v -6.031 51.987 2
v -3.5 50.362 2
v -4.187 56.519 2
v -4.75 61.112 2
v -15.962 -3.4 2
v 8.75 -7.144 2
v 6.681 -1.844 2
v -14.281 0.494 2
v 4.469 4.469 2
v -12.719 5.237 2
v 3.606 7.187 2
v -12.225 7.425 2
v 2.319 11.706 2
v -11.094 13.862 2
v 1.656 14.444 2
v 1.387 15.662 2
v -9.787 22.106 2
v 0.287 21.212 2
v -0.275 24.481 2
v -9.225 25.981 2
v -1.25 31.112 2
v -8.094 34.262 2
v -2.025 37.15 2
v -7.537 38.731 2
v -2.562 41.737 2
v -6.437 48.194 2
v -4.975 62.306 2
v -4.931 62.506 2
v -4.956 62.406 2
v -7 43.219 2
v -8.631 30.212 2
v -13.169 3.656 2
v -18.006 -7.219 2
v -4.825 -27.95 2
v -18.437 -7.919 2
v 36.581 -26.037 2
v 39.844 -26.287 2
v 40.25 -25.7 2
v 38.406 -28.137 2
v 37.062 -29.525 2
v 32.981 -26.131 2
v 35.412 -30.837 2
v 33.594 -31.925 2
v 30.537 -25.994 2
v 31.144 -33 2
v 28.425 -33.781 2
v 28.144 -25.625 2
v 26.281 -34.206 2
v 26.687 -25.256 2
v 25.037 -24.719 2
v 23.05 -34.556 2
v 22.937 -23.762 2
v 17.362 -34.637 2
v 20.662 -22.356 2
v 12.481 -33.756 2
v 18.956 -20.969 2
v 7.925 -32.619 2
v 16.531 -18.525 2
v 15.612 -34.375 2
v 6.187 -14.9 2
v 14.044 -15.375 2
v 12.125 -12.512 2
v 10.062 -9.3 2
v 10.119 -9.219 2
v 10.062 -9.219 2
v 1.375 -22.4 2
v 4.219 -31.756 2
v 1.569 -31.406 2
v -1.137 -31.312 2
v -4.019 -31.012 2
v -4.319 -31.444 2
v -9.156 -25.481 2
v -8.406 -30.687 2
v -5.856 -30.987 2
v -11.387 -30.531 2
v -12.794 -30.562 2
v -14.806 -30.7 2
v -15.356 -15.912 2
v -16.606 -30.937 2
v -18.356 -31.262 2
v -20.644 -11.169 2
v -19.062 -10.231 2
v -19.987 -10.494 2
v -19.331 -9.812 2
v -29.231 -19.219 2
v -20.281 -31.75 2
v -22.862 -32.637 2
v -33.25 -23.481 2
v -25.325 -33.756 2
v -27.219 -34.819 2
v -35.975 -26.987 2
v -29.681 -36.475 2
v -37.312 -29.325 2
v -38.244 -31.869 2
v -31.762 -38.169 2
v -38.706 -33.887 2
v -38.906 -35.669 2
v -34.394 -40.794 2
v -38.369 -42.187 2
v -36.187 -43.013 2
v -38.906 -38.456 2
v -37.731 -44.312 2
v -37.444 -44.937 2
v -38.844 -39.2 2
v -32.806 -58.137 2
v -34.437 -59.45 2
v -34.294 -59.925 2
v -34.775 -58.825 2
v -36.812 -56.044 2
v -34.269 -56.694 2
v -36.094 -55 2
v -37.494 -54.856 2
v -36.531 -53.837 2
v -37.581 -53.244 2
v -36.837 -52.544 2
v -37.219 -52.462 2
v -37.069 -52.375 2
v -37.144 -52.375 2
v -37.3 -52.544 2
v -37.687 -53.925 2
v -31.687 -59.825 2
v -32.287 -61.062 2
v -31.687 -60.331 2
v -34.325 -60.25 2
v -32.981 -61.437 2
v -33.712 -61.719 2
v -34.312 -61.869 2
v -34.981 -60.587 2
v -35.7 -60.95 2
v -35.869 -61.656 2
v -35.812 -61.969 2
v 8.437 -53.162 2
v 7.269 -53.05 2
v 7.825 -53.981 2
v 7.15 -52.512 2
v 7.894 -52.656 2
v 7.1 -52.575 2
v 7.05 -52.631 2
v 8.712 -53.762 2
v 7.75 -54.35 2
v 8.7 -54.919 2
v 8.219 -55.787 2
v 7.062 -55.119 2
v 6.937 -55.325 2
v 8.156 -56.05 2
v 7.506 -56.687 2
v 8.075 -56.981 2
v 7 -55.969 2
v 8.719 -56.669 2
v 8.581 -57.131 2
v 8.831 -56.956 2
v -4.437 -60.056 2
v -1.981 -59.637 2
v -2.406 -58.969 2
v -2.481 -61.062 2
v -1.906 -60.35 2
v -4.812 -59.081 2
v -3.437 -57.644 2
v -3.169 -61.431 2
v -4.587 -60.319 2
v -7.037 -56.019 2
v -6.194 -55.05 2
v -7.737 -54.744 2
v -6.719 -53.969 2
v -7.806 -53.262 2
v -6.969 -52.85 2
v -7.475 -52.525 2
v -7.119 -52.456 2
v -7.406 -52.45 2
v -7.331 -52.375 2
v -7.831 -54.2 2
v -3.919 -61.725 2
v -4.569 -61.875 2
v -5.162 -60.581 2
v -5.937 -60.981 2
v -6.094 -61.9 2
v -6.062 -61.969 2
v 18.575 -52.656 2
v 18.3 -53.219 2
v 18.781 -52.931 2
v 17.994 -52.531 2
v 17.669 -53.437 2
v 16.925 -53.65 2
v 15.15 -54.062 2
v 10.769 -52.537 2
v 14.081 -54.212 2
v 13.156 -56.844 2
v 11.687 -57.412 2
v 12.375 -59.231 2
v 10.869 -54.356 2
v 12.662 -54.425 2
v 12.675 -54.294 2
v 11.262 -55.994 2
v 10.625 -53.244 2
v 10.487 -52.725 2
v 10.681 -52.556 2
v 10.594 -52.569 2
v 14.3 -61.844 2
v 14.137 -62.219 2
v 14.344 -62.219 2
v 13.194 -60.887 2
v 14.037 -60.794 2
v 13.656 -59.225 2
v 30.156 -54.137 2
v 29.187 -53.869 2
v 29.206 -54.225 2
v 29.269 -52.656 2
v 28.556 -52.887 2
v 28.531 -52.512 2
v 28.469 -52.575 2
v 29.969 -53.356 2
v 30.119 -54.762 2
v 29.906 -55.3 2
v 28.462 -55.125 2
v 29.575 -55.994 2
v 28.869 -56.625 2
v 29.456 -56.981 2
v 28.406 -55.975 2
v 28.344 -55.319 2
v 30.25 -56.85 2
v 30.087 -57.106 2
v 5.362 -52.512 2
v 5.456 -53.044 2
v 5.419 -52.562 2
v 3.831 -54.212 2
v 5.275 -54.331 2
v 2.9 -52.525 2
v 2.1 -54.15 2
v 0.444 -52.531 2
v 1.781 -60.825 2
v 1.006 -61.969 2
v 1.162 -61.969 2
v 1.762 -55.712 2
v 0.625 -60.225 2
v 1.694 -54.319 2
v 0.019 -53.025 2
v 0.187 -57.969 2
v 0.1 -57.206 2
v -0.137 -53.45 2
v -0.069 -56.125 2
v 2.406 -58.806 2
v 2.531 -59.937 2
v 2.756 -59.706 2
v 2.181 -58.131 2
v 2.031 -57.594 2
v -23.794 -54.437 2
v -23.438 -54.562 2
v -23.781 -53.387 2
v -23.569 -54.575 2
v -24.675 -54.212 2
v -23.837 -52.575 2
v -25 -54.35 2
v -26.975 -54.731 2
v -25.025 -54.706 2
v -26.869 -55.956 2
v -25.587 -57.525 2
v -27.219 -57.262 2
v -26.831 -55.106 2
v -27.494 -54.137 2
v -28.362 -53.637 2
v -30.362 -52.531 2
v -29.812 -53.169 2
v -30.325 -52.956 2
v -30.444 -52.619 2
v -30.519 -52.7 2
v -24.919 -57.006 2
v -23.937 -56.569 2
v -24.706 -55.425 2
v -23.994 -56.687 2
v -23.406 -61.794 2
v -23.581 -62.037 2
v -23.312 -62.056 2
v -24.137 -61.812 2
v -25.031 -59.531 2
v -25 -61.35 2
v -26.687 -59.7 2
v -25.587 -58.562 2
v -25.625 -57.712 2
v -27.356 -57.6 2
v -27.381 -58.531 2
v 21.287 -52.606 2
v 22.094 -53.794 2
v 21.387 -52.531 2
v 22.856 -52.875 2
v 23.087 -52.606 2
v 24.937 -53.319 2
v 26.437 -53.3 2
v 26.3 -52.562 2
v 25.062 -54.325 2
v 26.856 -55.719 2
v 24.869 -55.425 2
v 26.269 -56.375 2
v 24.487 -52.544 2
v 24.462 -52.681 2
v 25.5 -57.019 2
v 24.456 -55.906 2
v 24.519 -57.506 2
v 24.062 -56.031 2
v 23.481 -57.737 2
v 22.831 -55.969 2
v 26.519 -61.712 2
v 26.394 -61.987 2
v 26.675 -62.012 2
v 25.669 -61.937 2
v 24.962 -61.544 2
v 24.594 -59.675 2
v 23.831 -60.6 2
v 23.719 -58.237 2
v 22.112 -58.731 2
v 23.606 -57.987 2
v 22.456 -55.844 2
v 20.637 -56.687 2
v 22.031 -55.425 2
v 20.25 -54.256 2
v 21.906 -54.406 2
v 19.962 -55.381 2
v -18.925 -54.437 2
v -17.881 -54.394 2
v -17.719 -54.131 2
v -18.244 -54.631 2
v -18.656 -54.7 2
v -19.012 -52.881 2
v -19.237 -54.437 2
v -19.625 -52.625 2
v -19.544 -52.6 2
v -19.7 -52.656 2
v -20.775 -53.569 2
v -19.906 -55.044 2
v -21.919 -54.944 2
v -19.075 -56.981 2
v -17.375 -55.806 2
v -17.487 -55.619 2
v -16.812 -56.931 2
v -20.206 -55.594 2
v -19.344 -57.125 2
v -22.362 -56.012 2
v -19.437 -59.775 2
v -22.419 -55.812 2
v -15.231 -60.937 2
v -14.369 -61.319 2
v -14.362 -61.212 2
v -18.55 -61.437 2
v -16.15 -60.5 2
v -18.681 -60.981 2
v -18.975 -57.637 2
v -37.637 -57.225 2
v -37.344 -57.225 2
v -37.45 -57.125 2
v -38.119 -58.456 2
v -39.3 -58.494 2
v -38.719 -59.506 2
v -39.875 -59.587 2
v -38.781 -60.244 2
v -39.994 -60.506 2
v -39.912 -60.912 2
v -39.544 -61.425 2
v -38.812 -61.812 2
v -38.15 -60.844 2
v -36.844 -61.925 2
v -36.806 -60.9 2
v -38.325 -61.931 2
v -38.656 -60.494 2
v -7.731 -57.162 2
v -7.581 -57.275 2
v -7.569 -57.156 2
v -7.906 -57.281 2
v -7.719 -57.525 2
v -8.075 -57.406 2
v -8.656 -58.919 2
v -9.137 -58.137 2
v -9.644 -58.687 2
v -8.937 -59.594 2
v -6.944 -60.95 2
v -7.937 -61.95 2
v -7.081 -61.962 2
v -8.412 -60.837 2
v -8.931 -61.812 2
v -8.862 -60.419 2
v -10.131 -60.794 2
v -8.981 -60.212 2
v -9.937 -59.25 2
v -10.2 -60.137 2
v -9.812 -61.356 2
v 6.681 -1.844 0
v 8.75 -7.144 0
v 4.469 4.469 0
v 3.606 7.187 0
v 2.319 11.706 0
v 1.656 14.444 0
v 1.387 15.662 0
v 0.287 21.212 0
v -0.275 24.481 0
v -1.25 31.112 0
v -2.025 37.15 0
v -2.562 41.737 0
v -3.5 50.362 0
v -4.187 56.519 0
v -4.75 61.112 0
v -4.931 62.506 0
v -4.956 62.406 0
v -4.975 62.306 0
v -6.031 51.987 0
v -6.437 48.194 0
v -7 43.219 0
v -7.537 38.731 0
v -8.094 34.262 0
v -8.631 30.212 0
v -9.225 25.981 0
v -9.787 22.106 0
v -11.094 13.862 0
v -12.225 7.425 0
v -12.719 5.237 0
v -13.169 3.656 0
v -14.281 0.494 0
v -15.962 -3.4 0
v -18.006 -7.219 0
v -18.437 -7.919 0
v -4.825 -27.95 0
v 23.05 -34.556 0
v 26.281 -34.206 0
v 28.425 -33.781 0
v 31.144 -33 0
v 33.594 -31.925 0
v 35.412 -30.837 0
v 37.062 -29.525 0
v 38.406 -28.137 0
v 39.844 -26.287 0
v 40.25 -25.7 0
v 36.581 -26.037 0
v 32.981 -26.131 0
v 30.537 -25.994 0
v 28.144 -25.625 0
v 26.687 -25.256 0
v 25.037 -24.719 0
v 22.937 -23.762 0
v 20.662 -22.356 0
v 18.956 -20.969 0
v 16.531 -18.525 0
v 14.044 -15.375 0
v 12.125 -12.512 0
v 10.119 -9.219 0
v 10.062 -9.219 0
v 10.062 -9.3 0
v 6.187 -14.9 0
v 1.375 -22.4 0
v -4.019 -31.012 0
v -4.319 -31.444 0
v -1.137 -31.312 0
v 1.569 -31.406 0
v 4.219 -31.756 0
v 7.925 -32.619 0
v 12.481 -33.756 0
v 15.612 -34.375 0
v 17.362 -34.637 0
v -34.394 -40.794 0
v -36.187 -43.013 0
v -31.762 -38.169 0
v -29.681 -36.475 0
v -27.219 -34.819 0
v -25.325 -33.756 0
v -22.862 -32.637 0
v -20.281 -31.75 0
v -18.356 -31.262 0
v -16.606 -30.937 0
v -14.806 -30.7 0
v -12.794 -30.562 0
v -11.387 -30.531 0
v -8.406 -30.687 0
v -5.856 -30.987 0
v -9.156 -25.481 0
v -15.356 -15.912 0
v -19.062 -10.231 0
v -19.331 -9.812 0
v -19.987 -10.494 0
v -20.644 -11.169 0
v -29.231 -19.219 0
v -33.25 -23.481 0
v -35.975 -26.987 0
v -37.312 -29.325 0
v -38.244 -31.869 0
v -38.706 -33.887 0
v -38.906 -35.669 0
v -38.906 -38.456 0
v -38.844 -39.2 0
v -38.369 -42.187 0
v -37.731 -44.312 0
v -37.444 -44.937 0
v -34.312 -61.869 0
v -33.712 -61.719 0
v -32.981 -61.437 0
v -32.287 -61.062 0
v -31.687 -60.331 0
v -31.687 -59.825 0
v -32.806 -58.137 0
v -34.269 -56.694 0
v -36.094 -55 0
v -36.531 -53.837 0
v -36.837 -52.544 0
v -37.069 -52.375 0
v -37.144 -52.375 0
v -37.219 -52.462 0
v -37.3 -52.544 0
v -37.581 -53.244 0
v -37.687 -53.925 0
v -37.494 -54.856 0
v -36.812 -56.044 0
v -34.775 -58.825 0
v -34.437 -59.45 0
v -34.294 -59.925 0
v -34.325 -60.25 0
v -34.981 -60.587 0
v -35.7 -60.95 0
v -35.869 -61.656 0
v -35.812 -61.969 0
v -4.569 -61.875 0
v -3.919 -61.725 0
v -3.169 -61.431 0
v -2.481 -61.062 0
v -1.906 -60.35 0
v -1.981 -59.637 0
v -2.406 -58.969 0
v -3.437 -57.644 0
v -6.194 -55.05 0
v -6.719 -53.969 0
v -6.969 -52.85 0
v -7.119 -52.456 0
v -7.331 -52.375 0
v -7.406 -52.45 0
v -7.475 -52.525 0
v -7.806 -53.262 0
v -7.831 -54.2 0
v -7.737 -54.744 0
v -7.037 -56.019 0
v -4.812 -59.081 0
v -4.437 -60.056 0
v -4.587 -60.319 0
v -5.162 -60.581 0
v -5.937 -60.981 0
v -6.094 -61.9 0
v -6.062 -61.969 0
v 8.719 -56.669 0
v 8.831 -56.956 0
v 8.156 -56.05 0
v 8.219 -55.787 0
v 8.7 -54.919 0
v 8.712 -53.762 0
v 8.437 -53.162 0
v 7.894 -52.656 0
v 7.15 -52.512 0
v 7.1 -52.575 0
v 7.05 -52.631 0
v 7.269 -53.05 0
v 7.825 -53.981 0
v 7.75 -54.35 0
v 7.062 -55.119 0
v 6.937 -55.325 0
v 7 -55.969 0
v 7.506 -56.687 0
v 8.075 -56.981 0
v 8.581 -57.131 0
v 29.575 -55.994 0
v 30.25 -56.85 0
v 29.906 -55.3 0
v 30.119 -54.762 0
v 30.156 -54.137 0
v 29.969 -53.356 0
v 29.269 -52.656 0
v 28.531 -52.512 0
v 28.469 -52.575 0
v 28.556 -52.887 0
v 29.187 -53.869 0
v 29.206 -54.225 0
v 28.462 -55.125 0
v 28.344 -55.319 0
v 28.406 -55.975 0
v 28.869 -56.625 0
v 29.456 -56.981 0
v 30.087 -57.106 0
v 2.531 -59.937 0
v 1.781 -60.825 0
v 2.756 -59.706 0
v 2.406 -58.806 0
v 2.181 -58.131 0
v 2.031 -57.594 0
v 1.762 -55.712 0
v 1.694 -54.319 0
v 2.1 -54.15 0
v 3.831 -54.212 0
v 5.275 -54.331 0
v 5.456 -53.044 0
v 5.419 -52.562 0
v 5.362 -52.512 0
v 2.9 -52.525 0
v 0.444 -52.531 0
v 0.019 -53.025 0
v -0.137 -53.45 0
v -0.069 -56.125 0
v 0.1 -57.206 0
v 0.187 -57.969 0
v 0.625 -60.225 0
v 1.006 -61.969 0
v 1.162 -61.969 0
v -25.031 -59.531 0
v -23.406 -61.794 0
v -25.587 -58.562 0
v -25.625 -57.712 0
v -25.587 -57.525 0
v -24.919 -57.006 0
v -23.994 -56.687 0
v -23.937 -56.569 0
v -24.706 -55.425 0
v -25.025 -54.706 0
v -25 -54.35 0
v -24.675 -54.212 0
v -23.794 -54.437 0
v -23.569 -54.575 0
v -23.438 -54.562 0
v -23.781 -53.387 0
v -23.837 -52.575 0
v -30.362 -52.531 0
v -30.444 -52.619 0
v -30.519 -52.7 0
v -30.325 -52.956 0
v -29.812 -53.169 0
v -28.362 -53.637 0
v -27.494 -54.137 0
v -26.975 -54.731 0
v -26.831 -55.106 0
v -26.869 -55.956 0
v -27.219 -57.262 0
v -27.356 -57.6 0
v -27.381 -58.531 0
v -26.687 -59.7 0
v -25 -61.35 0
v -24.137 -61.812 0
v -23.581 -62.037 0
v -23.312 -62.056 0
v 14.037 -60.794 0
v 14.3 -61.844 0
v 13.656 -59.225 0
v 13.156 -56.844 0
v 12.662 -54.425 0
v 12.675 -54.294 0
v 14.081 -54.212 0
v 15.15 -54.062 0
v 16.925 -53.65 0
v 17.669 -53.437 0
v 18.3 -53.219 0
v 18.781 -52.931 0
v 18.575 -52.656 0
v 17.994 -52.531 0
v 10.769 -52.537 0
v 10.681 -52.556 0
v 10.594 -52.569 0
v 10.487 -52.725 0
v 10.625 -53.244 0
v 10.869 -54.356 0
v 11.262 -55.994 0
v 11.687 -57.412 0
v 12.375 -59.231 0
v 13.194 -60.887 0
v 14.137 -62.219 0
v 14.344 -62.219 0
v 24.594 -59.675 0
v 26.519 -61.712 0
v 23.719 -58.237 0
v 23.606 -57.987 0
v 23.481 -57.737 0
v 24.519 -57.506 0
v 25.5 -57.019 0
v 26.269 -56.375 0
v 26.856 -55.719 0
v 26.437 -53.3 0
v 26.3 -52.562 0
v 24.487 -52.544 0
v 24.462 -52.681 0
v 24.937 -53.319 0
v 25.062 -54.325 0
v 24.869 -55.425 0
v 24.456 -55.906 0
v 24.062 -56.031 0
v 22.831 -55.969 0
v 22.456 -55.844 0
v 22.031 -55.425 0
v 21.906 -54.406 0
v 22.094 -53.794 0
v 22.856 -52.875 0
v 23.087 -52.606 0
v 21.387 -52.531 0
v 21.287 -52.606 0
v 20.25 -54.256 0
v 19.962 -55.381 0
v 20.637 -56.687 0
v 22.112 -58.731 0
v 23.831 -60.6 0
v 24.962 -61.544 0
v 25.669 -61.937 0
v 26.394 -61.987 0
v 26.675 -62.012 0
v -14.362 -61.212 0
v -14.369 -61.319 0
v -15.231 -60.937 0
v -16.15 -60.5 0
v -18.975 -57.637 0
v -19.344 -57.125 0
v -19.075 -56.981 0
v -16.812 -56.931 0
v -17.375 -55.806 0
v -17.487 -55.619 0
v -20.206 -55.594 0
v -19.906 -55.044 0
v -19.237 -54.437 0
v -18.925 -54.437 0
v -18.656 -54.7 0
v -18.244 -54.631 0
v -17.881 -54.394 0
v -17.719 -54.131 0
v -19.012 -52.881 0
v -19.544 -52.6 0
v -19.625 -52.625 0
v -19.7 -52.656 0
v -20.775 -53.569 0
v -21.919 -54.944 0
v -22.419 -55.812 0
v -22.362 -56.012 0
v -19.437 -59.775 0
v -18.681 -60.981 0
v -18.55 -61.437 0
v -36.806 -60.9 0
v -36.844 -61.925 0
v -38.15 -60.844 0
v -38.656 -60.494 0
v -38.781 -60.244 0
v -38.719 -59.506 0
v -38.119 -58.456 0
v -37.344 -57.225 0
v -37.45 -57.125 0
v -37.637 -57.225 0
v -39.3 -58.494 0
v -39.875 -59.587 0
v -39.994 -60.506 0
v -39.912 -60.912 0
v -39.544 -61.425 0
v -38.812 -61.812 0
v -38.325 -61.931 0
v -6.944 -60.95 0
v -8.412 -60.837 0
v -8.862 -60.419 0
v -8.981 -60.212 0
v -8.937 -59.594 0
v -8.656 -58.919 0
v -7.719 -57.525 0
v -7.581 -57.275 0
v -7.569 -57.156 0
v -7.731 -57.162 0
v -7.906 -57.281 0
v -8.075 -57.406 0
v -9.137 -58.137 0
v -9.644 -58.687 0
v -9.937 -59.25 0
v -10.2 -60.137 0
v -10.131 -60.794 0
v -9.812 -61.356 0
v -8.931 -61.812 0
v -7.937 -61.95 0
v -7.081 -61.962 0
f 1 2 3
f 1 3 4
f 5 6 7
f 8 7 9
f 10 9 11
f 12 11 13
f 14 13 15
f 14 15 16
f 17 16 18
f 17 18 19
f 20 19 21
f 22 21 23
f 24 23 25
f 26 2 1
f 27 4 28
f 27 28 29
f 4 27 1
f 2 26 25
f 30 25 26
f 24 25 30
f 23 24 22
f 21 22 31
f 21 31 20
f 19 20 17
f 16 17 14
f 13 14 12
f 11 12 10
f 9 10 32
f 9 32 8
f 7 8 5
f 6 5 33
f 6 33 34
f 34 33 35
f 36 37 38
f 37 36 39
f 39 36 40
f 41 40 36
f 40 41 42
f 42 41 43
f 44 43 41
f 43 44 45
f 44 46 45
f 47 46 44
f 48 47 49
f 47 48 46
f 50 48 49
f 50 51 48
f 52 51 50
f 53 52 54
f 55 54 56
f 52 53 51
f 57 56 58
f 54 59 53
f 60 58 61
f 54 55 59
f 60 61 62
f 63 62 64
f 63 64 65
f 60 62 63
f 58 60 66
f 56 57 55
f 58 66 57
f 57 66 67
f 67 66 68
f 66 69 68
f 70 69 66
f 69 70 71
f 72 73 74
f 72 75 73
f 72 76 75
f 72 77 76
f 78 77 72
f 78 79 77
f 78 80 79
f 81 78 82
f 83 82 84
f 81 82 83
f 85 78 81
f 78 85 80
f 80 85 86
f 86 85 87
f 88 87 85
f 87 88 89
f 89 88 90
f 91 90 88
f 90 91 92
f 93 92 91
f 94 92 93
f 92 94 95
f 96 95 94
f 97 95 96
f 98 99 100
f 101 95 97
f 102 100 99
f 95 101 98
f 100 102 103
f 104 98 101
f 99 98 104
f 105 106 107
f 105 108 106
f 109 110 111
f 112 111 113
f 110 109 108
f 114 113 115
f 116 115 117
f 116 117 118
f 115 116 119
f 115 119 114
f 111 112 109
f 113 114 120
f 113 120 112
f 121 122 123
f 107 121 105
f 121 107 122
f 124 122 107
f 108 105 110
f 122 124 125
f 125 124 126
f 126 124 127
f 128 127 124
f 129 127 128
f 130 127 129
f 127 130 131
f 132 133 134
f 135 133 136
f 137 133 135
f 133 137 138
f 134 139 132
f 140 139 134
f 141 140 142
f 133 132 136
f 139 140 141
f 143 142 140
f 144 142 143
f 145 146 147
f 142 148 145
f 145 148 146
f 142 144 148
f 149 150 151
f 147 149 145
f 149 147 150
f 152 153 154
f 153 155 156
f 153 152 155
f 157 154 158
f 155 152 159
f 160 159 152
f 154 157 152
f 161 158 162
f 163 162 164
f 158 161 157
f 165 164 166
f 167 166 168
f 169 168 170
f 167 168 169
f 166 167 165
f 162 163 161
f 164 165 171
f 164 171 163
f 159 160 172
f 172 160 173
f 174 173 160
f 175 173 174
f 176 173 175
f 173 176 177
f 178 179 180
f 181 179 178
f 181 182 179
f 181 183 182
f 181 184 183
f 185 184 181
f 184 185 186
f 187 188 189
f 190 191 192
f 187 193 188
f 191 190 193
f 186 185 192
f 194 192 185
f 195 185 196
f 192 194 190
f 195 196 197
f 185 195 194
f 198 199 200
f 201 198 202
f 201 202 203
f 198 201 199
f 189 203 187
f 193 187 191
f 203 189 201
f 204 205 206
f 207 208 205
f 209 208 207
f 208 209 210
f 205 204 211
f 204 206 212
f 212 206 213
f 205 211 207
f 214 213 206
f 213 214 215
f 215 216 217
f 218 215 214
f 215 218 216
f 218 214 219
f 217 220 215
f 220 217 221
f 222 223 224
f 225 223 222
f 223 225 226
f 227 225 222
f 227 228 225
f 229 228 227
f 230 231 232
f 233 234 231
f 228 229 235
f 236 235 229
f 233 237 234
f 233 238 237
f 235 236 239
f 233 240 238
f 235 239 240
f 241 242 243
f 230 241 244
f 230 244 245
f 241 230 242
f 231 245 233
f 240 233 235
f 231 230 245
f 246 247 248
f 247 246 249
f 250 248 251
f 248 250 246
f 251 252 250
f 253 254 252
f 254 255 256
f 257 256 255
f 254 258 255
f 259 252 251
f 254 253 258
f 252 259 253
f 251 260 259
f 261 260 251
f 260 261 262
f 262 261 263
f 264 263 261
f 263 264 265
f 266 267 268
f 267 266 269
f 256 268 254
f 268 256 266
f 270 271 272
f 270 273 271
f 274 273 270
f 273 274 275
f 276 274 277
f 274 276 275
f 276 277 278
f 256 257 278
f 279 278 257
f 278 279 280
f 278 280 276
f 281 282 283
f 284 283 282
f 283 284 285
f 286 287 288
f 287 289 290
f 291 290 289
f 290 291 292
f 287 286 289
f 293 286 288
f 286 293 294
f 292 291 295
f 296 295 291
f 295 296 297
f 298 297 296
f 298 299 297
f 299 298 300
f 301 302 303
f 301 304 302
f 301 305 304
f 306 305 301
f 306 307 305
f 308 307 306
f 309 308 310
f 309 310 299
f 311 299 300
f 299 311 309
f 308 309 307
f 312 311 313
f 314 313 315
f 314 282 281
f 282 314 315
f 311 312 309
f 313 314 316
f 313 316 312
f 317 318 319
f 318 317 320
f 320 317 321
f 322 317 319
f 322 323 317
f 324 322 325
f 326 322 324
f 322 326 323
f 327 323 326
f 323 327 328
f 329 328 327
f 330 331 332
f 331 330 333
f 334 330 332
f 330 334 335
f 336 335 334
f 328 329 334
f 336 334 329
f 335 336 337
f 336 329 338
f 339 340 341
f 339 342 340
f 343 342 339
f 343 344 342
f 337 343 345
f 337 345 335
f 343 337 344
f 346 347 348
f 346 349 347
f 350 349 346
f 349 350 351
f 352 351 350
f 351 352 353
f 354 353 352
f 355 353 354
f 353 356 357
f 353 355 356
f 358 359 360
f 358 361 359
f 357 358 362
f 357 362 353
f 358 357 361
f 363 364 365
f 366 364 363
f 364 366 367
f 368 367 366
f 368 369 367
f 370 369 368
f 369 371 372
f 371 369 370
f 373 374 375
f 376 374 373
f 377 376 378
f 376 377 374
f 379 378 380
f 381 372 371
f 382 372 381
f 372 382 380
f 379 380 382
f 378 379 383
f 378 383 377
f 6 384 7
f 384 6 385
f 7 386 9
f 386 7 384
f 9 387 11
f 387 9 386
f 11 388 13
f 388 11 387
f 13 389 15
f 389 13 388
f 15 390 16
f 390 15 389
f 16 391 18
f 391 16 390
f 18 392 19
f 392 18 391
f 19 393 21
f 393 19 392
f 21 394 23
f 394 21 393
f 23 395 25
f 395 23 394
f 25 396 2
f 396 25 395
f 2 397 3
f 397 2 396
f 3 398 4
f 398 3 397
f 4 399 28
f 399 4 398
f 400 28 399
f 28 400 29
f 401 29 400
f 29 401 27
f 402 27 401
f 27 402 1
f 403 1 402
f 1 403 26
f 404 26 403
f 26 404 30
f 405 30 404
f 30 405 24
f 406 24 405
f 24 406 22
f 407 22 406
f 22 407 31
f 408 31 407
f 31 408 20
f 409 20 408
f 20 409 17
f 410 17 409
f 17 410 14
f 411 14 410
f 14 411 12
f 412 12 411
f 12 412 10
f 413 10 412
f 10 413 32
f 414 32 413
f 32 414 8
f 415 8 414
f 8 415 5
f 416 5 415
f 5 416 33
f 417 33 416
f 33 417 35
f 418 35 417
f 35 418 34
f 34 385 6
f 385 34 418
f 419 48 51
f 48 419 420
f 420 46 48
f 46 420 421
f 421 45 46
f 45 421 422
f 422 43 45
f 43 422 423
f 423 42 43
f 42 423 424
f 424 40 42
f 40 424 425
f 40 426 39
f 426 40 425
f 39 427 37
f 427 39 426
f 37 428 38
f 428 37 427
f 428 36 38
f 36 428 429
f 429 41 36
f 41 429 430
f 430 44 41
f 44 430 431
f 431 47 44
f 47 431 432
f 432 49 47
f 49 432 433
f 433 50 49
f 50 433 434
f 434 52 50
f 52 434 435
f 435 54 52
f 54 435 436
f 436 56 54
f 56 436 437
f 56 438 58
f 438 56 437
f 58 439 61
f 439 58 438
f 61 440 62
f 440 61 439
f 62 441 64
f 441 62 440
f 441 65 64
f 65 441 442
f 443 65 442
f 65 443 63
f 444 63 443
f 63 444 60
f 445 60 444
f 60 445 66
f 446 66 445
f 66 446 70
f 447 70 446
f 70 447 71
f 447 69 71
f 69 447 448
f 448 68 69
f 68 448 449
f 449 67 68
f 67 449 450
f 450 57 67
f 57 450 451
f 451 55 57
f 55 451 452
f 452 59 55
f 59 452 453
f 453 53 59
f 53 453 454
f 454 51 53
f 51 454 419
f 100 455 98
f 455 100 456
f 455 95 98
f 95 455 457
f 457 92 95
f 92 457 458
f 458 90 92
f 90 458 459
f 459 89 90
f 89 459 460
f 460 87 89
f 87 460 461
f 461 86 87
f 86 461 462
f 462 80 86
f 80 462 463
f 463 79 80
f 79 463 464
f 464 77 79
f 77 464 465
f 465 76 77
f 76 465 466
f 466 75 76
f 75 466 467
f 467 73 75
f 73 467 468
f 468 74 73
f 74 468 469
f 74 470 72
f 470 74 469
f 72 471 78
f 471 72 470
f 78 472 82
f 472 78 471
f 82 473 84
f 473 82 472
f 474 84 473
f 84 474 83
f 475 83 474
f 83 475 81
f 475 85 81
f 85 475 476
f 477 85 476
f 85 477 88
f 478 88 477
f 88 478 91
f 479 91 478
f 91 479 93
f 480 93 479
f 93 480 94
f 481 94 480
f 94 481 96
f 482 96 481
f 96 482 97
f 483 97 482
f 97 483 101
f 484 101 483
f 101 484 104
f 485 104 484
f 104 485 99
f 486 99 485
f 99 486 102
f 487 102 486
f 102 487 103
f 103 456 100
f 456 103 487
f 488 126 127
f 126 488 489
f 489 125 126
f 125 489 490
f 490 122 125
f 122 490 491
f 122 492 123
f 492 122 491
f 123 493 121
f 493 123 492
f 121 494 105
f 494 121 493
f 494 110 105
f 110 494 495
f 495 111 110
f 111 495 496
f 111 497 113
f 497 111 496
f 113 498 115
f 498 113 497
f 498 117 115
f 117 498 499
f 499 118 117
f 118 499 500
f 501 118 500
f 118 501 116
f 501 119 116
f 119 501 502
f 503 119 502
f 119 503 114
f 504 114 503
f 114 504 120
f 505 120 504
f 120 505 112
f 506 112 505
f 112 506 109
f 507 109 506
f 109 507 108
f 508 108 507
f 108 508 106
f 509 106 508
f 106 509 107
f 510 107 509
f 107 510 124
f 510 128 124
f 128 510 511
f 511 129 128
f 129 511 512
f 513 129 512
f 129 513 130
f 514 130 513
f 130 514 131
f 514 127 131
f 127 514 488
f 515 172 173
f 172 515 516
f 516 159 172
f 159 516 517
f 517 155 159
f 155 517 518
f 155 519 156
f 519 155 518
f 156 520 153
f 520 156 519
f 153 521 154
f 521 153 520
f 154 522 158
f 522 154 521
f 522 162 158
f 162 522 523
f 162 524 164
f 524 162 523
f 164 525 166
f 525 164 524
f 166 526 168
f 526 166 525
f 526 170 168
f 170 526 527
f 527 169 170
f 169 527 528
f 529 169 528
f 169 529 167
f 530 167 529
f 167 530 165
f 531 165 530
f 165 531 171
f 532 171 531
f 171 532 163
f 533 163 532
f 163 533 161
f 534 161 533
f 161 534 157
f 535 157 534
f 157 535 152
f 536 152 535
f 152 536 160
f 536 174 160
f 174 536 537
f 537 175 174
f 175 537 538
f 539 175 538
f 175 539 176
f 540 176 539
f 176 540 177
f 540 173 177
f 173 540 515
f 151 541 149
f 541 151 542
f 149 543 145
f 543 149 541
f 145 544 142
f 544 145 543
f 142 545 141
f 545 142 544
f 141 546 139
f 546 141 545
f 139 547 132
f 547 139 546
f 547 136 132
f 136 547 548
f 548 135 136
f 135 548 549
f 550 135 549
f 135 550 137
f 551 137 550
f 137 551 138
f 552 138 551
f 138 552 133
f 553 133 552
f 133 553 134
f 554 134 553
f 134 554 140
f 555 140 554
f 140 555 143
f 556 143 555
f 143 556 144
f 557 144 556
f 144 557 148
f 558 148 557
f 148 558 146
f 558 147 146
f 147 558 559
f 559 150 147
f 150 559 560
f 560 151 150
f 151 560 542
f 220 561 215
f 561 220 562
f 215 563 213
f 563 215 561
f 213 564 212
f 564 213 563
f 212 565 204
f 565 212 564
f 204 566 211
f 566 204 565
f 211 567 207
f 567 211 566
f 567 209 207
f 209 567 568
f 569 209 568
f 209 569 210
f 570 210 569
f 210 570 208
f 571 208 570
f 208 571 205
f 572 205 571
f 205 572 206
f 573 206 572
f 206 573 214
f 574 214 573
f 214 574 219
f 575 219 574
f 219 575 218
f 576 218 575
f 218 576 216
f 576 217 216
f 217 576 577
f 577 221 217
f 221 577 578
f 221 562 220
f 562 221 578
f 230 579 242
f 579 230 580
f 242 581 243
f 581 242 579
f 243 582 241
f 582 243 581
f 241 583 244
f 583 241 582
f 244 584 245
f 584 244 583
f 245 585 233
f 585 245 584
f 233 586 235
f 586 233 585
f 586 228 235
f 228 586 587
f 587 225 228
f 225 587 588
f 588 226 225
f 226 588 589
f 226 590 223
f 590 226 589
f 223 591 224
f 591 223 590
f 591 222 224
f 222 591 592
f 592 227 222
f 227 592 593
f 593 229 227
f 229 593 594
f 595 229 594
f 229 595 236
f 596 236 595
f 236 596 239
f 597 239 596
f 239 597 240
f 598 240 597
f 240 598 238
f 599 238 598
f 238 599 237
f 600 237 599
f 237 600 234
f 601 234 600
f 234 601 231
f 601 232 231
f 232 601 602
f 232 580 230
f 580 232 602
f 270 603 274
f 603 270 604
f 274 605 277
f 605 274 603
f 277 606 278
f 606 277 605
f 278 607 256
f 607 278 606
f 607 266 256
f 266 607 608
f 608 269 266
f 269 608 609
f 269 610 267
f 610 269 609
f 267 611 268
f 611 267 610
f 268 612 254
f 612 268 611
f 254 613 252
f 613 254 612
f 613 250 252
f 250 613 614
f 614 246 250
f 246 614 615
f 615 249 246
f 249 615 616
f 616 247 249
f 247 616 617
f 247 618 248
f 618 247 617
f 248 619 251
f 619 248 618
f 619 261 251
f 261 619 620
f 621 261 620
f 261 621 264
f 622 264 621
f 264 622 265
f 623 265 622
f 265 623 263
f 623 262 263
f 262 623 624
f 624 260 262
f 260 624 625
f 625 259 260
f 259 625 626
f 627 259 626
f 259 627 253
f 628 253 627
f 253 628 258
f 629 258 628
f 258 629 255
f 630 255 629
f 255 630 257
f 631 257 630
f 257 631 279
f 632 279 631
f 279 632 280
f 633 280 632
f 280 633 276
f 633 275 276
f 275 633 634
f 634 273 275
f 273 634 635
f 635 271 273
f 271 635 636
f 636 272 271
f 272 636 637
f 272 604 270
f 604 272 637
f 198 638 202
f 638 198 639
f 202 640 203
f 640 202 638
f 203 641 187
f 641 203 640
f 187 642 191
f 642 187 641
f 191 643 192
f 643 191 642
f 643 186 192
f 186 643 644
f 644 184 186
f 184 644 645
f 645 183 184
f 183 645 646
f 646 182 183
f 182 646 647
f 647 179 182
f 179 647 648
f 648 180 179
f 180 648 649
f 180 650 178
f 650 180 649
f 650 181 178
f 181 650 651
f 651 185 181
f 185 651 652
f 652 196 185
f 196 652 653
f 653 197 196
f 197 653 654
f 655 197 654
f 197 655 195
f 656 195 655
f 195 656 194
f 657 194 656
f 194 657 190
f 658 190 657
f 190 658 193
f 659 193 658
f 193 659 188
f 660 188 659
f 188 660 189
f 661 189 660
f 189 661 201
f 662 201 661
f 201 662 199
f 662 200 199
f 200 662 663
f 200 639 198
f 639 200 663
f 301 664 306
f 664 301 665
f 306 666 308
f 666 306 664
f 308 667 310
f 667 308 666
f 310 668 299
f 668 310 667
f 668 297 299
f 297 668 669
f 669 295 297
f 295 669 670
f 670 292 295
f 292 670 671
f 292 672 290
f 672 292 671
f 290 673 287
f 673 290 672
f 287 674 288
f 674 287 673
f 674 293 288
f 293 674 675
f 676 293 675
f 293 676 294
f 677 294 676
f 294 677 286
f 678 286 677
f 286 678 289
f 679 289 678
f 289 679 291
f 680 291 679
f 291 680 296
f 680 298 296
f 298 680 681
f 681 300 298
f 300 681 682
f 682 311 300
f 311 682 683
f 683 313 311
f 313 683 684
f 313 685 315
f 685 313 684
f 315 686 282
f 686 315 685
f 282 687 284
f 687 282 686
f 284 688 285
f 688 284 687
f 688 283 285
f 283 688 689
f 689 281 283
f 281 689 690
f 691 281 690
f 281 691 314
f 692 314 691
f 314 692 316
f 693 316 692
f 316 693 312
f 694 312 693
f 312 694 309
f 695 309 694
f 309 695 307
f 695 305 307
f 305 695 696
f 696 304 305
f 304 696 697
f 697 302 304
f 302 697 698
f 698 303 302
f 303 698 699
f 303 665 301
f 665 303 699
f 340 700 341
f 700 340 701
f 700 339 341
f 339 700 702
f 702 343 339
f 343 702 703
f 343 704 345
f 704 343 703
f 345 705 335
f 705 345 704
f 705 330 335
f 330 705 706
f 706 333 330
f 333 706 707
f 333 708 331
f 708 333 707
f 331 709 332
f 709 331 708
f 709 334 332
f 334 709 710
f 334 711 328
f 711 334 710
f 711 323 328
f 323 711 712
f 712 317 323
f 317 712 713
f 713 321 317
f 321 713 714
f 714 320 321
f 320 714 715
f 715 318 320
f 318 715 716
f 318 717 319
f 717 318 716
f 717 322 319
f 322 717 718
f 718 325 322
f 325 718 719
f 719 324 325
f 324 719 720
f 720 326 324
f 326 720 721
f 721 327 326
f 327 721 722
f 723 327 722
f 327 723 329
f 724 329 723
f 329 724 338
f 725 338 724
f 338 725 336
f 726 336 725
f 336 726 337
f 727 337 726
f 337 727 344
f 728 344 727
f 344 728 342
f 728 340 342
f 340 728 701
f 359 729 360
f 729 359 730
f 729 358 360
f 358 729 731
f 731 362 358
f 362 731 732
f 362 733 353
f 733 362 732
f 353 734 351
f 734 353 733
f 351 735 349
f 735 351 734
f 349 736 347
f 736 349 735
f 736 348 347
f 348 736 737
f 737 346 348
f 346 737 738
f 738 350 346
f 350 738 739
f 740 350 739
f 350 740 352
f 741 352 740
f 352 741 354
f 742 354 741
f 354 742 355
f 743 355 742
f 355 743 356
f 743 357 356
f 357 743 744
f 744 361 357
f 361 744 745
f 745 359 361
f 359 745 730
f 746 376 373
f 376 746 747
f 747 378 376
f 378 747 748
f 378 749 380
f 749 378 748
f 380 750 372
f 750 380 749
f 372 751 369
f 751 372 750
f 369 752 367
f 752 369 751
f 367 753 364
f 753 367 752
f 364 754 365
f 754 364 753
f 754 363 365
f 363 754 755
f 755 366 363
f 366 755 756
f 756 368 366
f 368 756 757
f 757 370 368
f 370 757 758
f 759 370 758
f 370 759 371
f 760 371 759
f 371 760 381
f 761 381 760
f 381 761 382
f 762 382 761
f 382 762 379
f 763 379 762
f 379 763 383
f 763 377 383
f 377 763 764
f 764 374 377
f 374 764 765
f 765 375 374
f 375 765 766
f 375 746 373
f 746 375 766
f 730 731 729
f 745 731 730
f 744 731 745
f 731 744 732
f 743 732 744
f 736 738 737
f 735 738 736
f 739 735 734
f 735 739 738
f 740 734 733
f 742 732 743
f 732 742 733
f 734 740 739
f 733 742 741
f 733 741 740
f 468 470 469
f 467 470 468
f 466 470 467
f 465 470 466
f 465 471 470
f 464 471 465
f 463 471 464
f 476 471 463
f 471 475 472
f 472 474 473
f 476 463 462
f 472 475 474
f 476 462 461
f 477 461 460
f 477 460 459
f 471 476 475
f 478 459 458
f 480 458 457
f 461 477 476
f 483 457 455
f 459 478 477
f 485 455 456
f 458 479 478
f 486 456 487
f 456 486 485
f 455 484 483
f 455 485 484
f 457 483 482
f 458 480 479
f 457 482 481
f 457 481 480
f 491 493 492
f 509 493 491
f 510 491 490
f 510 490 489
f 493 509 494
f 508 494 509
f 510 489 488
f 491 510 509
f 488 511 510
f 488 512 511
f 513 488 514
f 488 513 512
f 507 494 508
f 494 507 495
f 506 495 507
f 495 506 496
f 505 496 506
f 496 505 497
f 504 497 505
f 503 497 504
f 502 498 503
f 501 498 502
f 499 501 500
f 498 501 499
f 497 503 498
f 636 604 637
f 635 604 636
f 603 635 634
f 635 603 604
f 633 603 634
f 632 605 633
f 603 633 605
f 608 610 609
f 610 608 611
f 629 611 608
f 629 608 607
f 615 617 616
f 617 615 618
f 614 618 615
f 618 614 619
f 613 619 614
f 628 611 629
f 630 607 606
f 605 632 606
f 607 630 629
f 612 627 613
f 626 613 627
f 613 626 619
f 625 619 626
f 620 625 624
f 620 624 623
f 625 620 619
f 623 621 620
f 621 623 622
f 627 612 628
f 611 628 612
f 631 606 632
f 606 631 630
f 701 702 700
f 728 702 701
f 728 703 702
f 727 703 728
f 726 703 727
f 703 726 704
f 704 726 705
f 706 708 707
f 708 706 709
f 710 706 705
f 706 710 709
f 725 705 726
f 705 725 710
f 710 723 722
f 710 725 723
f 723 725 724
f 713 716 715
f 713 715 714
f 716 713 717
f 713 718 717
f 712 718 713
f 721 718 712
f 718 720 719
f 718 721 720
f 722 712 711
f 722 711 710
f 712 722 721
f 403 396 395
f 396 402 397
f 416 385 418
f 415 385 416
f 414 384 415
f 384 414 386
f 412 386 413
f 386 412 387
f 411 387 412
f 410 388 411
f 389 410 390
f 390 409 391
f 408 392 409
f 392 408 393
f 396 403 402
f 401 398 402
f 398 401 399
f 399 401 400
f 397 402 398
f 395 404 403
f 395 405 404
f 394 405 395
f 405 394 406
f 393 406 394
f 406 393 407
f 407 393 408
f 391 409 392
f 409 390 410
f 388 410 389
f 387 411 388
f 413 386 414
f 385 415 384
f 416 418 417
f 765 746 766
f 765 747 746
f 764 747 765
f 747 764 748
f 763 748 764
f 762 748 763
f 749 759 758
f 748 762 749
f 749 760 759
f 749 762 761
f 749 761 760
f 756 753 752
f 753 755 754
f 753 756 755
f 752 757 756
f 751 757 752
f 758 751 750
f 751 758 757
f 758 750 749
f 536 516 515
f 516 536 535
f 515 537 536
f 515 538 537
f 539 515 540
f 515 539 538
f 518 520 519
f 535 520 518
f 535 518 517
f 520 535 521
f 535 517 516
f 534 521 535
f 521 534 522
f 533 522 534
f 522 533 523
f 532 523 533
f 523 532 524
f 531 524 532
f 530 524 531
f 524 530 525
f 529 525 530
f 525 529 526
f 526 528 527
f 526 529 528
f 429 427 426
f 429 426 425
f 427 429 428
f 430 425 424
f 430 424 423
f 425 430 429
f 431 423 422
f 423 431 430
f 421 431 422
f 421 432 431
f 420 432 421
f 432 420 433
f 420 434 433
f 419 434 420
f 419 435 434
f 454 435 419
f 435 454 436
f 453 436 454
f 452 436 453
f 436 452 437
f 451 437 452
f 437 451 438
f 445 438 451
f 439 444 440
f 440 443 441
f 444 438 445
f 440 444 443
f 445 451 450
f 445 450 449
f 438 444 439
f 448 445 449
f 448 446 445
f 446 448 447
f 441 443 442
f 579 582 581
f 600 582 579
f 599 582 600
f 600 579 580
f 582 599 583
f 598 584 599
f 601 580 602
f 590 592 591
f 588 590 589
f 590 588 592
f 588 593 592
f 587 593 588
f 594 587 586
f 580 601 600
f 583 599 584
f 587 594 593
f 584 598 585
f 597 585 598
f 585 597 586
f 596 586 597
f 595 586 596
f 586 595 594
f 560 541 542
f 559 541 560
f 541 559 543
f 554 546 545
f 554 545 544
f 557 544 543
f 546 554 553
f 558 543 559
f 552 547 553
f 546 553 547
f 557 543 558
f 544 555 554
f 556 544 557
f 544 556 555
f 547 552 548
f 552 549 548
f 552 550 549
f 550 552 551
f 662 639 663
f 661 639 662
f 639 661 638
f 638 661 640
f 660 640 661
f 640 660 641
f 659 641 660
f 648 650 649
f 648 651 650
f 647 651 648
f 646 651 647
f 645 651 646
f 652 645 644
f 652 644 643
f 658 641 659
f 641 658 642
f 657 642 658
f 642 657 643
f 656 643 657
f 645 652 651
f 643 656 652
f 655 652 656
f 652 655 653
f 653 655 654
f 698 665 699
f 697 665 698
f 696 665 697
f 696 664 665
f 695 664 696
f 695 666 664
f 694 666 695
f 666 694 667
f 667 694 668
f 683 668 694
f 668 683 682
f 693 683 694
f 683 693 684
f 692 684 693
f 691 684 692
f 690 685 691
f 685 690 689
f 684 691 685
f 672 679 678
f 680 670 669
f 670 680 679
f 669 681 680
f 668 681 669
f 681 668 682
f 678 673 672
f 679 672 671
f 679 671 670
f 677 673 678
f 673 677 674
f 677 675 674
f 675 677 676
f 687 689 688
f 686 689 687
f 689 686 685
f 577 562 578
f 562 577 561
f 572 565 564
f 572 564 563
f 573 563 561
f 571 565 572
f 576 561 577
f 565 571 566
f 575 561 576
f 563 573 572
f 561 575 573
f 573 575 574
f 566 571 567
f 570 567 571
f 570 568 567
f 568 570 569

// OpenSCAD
module 69fb3eec0a9b18f618c4e12213f0c10c_1()
{
 /* Generated by trace2scad version 20150415
    http://aggregate.org/MAKE/TRACE2SCAD/
    Optimized model has 387/4796 original points
 */
 color([0.48, 0.48, 0.48])
 assign(minx=0) /* polygon minx=39 */
 assign(miny=0) /* polygon miny=45 */
 assign(maxx=12880) /* polygon maxx=12880 */
 assign(maxy=20000) /* polygon maxy=20001 */
 assign(dx=maxx-minx)
 assign(dy=maxy-miny)
 assign(maxd=((dx>dy)?dx:dy))
 scale([1/maxd, 1/maxd, 1])
 translate([-minx-dx/2, -miny-dy/2, 0])
 linear_extrude(height=1, convexity=387)
 union() {
  union() {
   polygon([[5647,19985],[5644,19969],[5475,18318],[5410,17711],[5320,16915],[5234,16197],[5145,15482],[5059,14834],[4964,14157],[4874,13537],[4665,12218],[4484,11188],[4405,10838],[4333,10585],[4155,10079],[3886,9456],[3559,8845],[3490,8733],[5668,5528],[7840,8857],[7509,9705],[7155,10715],[7017,11150],[6811,11873],[6705,12311],[6662,12506],[6486,13394],[6396,13917],[6240,14978],[6116,15944],[6030,16678],[5880,18058],[5770,19043],[5680,19778],[5651,20001]], convexity=6);
   polygon([[8050,8518],[8050,8512],[7430,7616],[6660,6416],[5797,5038],[5749,4969],[6258,4990],[6691,4975],[7115,4919],[7708,4781],[8437,4599],[8938,4500],[9218,4458],[10128,4471],[10645,4527],[10988,4595],[11423,4720],[11815,4892],[12106,5066],[12370,5276],[12585,5498],[12815,5794],[12880,5888],[12293,5834],[11717,5819],[11326,5841],[10943,5900],[10710,5959],[10446,6045],[10110,6198],[9746,6423],[9473,6645],[9085,7036],[8687,7540],[8380,7998],[8059,8525],[8050,8525]], convexity=9);
   polygon([[3242,8321],[3137,8213],[1763,6925],[1120,6243],[684,5682],[470,5308],[321,4901],[247,4578],[215,4293],[215,3847],[225,3728],[301,3250],[403,2910],[449,2810],[650,3118],[937,3473],[1358,3893],[1691,4164],[2085,4429],[2388,4599],[2782,4778],[3195,4920],[3503,4998],[3783,5050],[4071,5088],[4393,5110],[4618,5115],[5095,5090],[5503,5042],[4975,5923],[3983,7454],[3390,8363],[3347,8430]], convexity=7);
   polygon([[485,1606],[472,1593],[427,1481],[410,1372],[441,1223],[550,1033],[876,588],[930,488],[953,412],[948,360],[843,306],[728,248],[701,135],[710,85],[950,101],[1046,125],[1163,170],[1274,230],[1370,347],[1370,428],[1191,698],[957,929],[665,1200],[595,1386],[546,1593],[509,1620],[497,1620]], convexity=8);
   polygon([[5255,1608],[5244,1596],[5191,1478],[5187,1328],[5202,1241],[5314,1037],[5670,547],[5730,391],[5706,349],[5614,307],[5490,243],[5465,96],[5470,85],[5709,100],[5813,124],[5933,171],[6043,230],[6135,344],[6123,458],[6055,565],[5890,777],[5449,1192],[5365,1365],[5325,1544],[5301,1607],[5267,1620]], convexity=8);
   polygon([[6904,1596],[6511,1595],[6443,1516],[6418,1448],[6429,1020],[6456,847],[6470,725],[6540,364],[6601,85],[6626,85],[6725,268],[6845,410],[6881,447],[6825,591],[6789,699],[6765,785],[6722,1086],[6711,1309],[6776,1336],[7053,1326],[7284,1307],[7313,1513],[7307,1590],[7298,1598]], convexity=10);
   polygon([[7576,1588],[7568,1579],[7603,1512],[7692,1363],[7680,1304],[7570,1181],[7550,1148],[7560,1045],[7641,930],[7732,883],[7813,859],[7853,887],[7835,933],[7745,1032],[7755,1074],[7832,1213],[7834,1398],[7790,1494],[7703,1575],[7584,1598]], convexity=10);
   polygon([[11000,1593],[10995,1588],[11009,1538],[11110,1381],[11113,1324],[10994,1180],[10975,1149],[10985,1044],[11059,940],[11153,883],[11254,863],[11280,904],[11172,1041],[11225,1152],[11259,1238],[11265,1338],[11235,1463],[11123,1575],[11005,1598]], convexity=10);
   polygon([[1569,1581],[1557,1568],[1588,1527],[1670,1493],[1902,1418],[2041,1338],[2124,1243],[2147,1183],[2141,1047],[2085,838],[2063,784],[2059,635],[2170,448],[2440,184],[2578,110],[2667,74],[2710,71],[2695,113],[2435,475],[2346,630],[2340,766],[2346,796],[2453,879],[2601,930],[2610,949],[2487,1132],[2436,1247],[2440,1304],[2492,1326],[2633,1290],[2669,1268],[2690,1270],[2635,1458],[2626,1588],[1582,1595]], convexity=13);
   polygon([[8149,1591],[8135,1589],[8118,1564],[8140,1481],[8179,1303],[8242,1041],[8310,814],[8420,523],[8551,258],[8702,45],[8735,45],[8728,105],[8686,273],[8625,524],[8545,905],[8466,1292],[8468,1313],[8693,1326],[8864,1350],[9148,1416],[9267,1450],[9368,1485],[9445,1531],[9412,1575],[9319,1595],[8163,1594]], convexity=9);
   polygon([[9854,1589],[9846,1583],[9680,1319],[9634,1139],[9742,930],[9978,603],[10253,304],[10434,153],[10547,90],[10663,82],[10708,78],[10683,126],[10375,452],[10235,682],[10217,722],[10197,762],[10363,799],[10520,877],[10643,980],[10737,1085],[10670,1472],[10648,1590],[10358,1593],[10354,1571],[10430,1469],[10450,1308],[10419,1132],[10353,1055],[10290,1035],[10093,1045],[10033,1065],[9965,1132],[9945,1295],[9975,1393],[10097,1540],[10134,1583],[9862,1595]], convexity=13);
   polygon([[3300,1580],[3288,1575],[3116,1429],[2933,1209],[2853,1070],[2862,1038],[3330,436],[3451,243],[3472,170],[4141,189],[4142,206],[4003,250],[3856,320],[3404,778],[3345,860],[3388,883],[3750,891],[3660,1071],[3642,1101],[3207,1105],[3255,1193],[3362,1290],[3412,1290],[3455,1248],[3521,1259],[3579,1297],[3605,1339],[3398,1539],[3313,1584]], convexity=12);
   polygon([[433,852],[418,844],[152,641],[60,466],[41,319],[54,254],[113,172],[230,110],[308,91],[545,92],[551,256],[336,265],[255,321],[235,361],[245,479],[341,647],[465,844],[448,860]], convexity=8);
   polygon([[5175,835],[5148,815],[4978,698],[4897,610],[4850,520],[4808,378],[4819,273],[4870,183],[5011,110],[5170,88],[5307,86],[5329,248],[5094,266],[5022,333],[5003,366],[5010,465],[5055,573],[5205,796],[5227,836],[5229,855],[5203,854]], convexity=8);
  }
 }
}

module 69fb3eec0a9b18f618c4e12213f0c10c()
{
 /* all layers combined, scaled to within a 1mm cube */
 scale([1, 1, 1/1])
 difference() {
  union() {
   scale([1,1,2]) translate([0,0,-0.5]) 69fb3eec0a9b18f618c4e12213f0c10c_1();
  }
  translate([0,0,-2]) cube([2,2,4],center=true);
 }
}

scale([125, 125, 2]) {
	69fb3eec0a9b18f618c4e12213f0c10c();
}
